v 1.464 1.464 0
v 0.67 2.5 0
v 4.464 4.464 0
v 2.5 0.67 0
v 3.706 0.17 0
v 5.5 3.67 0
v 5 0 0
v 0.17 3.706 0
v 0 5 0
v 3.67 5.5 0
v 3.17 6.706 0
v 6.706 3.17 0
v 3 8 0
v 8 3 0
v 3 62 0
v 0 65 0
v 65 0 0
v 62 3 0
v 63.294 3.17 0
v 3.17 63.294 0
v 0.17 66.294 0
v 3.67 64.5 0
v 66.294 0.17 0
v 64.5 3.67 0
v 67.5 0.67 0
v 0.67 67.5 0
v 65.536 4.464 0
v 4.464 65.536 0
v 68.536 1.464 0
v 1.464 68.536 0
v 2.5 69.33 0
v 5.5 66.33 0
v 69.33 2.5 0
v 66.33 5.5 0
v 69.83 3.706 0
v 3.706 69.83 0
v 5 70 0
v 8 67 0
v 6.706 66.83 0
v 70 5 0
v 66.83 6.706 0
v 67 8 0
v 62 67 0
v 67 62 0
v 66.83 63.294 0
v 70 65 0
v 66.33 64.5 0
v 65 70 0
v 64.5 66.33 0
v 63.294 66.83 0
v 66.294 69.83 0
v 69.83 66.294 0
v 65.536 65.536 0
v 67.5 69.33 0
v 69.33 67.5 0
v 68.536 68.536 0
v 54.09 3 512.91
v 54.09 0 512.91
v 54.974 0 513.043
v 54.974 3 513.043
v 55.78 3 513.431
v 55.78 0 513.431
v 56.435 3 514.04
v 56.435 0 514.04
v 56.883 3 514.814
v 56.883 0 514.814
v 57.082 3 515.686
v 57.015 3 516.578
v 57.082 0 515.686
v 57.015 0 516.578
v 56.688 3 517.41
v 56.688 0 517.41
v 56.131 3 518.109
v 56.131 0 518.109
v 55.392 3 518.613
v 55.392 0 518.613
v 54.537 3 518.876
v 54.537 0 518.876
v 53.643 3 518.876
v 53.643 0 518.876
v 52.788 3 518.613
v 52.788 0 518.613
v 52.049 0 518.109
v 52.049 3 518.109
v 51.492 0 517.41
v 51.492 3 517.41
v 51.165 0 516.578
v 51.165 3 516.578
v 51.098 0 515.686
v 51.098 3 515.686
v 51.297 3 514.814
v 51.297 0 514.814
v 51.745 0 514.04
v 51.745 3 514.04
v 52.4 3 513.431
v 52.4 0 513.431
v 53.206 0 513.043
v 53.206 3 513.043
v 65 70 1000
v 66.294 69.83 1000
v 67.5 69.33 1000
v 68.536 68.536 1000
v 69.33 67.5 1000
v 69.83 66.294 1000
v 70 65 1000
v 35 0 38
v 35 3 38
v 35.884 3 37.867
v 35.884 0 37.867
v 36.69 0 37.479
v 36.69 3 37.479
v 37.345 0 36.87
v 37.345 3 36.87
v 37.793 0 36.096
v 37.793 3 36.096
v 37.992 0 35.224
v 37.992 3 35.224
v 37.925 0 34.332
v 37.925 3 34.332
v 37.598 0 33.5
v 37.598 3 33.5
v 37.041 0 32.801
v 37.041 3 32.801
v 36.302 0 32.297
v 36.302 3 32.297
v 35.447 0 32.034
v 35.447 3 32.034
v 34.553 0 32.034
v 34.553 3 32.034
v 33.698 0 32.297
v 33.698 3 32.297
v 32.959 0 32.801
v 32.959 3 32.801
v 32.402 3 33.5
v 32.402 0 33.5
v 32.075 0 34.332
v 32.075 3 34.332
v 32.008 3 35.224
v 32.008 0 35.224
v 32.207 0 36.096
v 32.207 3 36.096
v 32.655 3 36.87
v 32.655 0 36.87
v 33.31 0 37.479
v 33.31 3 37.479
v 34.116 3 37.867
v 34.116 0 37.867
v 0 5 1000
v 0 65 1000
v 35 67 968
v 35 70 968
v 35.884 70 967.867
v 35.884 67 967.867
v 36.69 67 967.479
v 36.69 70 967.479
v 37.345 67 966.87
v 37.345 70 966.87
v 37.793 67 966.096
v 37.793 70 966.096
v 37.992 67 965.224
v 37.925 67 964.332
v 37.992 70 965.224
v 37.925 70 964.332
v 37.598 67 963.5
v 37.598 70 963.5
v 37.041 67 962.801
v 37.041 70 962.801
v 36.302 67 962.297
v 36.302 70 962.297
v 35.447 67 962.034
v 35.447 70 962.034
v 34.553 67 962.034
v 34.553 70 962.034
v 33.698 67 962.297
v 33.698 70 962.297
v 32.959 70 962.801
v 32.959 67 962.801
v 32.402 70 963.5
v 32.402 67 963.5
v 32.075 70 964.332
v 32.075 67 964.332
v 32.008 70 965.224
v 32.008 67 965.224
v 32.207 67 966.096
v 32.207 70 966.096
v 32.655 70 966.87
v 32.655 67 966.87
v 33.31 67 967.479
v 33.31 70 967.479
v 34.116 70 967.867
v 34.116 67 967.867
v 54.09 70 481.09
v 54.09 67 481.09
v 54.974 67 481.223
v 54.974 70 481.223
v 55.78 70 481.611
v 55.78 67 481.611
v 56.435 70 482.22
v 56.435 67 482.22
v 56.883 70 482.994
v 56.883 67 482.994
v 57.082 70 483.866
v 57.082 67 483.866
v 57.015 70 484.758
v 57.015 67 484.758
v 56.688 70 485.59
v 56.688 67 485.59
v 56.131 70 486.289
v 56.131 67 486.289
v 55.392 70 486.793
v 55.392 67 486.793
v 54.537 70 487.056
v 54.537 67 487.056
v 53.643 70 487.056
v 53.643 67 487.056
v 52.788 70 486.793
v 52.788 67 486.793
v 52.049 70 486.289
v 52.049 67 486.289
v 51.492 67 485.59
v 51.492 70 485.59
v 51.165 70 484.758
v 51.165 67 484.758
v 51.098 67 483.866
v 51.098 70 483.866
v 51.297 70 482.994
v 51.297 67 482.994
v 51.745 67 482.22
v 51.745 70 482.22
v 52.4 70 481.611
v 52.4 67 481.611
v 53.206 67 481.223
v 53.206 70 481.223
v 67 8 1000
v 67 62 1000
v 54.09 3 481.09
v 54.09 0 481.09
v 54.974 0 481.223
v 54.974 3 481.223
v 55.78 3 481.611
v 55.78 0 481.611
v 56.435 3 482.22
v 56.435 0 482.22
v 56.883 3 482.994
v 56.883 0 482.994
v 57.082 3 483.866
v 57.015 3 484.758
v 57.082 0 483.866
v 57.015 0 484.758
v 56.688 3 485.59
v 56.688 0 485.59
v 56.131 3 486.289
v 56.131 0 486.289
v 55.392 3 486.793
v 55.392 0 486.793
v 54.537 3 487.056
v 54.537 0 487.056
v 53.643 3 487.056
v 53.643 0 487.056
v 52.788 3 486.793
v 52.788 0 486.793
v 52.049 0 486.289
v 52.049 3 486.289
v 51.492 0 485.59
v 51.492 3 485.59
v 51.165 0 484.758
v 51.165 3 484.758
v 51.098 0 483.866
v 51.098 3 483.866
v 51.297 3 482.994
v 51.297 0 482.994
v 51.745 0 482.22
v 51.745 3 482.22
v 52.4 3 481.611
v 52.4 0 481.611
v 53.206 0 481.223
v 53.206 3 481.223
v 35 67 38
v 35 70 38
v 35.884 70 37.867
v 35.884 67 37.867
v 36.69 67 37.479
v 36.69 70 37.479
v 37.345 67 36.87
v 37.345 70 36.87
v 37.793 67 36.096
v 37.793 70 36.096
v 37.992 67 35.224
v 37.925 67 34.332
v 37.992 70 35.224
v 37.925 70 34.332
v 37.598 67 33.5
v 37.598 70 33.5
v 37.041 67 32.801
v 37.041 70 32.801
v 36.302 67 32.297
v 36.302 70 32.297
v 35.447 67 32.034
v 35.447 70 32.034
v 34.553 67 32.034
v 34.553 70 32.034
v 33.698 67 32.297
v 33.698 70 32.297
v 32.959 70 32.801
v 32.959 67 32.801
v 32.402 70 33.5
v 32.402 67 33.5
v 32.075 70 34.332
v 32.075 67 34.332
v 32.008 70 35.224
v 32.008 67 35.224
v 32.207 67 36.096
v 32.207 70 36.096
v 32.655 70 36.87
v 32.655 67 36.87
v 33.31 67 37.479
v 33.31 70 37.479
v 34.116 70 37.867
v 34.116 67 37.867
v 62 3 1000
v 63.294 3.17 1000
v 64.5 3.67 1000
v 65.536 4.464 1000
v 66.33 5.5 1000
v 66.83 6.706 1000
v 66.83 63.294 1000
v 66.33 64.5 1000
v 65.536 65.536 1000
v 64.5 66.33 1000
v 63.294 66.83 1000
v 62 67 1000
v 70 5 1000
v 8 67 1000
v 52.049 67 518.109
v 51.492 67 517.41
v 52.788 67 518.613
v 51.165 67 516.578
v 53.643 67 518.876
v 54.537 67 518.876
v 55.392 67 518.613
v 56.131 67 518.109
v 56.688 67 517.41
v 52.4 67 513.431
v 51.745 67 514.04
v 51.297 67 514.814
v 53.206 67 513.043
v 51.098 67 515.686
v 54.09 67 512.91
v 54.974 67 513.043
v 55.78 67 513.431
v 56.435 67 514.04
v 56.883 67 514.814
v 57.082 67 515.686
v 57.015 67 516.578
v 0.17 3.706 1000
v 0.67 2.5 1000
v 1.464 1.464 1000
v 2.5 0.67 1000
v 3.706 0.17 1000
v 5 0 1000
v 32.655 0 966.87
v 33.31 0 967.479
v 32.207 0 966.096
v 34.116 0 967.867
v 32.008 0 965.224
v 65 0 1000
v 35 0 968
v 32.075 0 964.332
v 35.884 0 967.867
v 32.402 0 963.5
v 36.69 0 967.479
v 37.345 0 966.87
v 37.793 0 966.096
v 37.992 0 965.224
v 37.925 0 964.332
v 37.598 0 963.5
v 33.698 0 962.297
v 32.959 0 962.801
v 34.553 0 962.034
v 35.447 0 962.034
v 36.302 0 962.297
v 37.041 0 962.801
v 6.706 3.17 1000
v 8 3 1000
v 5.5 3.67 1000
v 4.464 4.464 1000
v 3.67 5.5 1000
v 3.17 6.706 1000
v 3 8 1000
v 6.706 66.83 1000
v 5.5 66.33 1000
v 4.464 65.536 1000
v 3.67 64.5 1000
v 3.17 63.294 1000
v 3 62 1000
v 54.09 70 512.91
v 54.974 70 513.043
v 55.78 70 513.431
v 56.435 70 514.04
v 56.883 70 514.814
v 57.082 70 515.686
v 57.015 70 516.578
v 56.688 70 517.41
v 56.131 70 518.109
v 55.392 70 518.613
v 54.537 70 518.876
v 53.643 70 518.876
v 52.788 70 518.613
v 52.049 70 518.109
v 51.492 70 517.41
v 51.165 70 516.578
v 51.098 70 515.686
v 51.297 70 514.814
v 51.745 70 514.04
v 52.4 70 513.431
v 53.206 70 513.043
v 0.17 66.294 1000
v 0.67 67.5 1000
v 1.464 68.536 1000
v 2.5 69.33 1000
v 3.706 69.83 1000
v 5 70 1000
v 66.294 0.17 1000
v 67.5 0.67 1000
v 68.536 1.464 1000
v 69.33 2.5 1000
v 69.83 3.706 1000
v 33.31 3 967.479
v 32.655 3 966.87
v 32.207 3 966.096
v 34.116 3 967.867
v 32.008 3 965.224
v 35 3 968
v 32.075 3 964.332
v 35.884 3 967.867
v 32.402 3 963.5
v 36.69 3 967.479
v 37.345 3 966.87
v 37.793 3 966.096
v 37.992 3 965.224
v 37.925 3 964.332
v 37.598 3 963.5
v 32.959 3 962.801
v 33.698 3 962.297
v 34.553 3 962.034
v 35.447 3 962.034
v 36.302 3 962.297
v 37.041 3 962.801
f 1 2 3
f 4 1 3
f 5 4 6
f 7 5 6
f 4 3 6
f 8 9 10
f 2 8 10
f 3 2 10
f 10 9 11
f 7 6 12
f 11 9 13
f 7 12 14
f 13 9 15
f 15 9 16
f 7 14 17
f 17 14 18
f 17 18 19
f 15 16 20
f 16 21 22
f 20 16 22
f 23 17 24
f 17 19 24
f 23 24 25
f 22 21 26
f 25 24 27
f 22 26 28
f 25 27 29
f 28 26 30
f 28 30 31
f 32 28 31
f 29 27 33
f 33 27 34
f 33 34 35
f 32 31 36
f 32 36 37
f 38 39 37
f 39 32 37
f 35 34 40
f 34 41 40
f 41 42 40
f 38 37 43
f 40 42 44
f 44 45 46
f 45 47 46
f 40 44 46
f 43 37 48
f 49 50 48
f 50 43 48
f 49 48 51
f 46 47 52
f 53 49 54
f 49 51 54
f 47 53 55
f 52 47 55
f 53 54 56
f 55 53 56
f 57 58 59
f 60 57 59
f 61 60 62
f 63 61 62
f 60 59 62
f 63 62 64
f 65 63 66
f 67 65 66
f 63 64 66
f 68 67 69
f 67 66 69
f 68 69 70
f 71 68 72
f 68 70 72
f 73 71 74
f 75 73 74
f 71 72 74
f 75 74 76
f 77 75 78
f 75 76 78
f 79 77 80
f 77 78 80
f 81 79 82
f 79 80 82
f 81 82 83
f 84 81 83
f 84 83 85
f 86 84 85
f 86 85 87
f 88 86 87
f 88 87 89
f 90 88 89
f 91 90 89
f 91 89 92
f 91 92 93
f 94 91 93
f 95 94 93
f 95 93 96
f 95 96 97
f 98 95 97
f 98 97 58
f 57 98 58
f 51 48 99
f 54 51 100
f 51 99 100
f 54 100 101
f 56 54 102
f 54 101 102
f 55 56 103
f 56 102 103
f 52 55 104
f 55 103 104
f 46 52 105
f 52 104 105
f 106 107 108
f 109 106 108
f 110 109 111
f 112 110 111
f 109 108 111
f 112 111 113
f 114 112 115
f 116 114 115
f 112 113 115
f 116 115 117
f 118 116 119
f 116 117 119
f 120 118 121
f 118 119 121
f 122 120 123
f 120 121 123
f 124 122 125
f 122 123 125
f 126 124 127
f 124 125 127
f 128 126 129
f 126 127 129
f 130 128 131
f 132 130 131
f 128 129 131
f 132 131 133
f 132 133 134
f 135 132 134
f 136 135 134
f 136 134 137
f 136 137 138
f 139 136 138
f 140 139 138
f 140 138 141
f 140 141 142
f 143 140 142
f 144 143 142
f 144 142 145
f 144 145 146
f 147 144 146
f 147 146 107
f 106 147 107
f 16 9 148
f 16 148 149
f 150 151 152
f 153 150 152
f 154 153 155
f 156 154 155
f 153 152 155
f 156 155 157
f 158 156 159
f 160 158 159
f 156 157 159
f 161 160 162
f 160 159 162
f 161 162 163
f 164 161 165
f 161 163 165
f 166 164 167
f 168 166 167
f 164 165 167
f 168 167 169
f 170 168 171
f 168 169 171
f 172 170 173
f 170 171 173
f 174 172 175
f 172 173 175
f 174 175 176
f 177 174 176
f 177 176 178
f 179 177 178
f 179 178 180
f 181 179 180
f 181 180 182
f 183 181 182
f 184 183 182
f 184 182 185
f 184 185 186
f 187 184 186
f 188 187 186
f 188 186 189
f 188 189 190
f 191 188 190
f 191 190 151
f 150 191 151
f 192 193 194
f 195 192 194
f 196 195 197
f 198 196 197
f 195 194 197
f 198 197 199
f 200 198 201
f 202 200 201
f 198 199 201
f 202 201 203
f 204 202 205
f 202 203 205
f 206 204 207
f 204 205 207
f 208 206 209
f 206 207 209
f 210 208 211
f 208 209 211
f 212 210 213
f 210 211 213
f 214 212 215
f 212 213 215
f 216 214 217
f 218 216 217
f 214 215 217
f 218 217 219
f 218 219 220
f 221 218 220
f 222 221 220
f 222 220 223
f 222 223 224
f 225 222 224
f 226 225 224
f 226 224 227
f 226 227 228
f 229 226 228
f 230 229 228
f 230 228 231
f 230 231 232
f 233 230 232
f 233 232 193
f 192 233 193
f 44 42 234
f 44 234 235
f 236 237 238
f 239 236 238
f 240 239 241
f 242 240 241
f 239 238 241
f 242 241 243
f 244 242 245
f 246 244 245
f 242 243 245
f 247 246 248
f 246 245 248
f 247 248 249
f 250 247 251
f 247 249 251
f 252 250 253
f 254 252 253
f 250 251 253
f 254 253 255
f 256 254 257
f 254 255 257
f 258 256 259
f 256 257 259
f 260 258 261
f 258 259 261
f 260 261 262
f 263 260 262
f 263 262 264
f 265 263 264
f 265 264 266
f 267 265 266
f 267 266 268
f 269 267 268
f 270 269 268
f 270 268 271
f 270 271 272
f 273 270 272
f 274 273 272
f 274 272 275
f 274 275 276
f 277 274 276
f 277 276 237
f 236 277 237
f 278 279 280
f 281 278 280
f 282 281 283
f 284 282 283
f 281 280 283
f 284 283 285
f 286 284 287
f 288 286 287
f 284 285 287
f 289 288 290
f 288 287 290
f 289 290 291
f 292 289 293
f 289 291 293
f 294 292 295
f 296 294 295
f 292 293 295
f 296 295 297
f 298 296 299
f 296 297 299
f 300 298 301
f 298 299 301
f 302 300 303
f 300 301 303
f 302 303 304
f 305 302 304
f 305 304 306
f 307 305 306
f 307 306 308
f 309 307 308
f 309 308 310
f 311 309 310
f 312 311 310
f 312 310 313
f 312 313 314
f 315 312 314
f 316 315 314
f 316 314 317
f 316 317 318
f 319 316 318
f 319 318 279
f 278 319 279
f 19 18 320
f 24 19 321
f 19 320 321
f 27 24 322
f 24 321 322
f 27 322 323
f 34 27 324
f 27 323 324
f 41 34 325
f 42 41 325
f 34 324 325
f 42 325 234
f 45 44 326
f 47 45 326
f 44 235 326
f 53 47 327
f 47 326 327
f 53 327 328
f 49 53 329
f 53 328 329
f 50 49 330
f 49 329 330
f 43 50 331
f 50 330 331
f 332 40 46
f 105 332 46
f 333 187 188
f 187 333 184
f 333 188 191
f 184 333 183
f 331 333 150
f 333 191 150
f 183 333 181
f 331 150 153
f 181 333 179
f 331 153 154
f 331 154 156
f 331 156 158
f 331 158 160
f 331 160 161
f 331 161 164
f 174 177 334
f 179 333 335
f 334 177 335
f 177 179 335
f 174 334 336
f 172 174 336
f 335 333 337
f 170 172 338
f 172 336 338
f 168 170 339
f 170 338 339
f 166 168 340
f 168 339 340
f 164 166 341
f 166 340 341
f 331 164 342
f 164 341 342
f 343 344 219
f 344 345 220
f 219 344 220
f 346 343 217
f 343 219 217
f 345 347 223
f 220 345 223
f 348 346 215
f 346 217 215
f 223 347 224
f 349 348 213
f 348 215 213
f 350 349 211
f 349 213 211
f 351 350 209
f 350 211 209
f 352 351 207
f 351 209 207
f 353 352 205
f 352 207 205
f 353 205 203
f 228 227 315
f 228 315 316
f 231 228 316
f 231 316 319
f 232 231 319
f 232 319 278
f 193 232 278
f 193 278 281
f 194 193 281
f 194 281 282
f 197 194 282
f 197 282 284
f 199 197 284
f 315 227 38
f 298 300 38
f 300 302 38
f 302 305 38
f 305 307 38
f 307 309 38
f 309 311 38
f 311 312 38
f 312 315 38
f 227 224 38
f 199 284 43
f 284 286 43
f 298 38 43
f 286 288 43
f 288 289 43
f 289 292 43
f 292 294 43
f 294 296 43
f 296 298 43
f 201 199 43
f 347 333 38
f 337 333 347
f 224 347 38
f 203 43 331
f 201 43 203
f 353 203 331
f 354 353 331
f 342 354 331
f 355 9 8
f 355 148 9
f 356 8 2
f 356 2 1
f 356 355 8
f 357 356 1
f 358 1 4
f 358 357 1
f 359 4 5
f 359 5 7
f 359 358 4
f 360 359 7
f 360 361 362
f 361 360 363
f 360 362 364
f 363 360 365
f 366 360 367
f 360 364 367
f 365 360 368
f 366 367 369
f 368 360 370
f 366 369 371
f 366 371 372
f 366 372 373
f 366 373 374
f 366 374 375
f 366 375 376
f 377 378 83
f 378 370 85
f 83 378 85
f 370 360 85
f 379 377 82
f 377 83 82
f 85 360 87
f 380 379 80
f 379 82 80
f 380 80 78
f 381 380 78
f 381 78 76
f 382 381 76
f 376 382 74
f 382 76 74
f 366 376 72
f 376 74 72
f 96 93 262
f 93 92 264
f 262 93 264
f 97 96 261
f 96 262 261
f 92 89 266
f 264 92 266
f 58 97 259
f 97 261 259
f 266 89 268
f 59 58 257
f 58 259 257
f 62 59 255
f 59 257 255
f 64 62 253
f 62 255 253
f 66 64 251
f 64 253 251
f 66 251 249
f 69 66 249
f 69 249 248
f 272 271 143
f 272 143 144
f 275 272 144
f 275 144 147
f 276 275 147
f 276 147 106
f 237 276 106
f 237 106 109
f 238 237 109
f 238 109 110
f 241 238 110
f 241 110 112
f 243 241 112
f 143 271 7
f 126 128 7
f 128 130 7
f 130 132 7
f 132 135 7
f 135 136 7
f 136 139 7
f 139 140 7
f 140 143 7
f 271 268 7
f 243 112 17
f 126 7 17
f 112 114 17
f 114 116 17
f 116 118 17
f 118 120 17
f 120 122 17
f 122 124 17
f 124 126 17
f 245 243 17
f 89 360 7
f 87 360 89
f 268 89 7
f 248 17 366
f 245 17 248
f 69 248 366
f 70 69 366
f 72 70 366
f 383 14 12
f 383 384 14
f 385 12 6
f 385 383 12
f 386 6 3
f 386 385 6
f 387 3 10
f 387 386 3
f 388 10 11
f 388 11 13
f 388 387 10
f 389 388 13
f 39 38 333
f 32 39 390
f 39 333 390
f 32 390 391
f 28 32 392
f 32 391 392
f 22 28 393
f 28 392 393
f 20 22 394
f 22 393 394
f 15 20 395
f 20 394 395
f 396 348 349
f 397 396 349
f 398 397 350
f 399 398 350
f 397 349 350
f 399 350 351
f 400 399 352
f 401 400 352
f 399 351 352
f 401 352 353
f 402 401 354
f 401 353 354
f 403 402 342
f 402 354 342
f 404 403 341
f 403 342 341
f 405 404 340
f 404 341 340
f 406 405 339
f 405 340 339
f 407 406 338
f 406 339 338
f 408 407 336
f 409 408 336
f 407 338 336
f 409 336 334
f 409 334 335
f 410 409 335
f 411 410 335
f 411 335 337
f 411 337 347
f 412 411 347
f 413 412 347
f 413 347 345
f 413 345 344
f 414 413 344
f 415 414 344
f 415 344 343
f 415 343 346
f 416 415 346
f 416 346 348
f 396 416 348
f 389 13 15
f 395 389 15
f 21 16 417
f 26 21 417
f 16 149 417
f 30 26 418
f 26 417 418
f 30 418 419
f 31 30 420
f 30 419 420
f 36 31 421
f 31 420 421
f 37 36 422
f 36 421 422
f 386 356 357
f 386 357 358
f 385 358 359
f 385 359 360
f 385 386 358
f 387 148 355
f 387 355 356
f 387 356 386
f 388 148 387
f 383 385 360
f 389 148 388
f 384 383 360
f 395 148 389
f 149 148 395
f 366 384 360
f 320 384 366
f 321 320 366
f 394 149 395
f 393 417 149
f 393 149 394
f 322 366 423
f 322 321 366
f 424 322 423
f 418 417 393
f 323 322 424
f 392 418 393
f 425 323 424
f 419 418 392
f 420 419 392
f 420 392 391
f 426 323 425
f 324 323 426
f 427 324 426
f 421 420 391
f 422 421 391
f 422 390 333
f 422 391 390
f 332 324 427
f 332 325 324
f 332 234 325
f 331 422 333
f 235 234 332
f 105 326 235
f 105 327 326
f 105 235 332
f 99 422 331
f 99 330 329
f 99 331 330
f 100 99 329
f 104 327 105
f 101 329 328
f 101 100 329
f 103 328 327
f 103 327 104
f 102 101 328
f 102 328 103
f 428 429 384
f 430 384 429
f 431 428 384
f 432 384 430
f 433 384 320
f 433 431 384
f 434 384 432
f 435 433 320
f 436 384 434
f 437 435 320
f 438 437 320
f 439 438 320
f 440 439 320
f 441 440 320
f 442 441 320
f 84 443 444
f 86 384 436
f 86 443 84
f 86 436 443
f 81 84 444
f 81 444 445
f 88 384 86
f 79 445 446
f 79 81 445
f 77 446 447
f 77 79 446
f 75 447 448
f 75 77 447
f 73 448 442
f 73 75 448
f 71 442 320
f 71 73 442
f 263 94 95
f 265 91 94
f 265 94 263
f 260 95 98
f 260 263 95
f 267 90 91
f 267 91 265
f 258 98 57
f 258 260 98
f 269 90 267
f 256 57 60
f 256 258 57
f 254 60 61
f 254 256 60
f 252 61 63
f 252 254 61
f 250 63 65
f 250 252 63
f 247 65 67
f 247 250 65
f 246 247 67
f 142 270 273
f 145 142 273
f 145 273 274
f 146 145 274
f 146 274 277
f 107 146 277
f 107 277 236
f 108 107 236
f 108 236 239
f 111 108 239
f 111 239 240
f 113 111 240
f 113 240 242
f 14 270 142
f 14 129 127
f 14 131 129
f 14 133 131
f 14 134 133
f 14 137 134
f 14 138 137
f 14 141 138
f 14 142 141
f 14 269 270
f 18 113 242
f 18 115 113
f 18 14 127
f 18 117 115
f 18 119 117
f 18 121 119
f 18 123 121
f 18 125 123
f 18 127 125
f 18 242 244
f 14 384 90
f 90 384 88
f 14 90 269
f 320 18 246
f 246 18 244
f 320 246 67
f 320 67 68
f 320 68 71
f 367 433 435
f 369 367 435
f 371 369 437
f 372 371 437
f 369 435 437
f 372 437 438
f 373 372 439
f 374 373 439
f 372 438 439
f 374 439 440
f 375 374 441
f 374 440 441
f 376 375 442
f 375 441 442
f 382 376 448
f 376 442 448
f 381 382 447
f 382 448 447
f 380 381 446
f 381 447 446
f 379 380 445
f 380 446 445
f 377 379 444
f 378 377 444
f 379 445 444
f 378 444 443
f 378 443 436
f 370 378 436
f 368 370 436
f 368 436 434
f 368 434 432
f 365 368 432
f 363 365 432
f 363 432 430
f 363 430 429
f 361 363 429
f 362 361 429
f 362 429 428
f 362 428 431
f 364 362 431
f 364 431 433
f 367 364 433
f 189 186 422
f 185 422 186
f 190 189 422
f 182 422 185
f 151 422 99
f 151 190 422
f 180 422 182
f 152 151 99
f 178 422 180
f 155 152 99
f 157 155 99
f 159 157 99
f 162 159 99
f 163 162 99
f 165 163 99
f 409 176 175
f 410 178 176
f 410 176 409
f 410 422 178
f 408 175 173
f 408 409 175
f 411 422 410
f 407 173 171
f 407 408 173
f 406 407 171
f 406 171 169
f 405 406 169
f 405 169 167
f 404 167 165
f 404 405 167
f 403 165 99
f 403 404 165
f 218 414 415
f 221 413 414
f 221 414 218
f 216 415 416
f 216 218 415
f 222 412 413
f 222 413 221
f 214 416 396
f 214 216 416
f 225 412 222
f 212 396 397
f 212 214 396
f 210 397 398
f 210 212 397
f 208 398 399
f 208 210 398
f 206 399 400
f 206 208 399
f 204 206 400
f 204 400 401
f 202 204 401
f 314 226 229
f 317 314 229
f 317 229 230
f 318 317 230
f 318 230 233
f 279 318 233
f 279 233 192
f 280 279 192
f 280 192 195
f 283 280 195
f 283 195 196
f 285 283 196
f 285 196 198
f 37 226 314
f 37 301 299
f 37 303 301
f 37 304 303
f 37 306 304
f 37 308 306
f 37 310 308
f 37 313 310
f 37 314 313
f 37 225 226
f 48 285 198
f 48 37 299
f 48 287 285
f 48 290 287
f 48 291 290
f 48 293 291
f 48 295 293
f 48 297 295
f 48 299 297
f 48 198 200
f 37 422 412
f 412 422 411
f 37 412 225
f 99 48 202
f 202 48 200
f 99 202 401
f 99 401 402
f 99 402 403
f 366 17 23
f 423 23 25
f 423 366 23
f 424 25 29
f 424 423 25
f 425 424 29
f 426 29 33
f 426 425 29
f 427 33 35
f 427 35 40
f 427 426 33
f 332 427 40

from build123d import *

# Parameters (mm, degrees)
SKETCH1_W           = 70
SKETCH1_H           = 70
SKETCH1_W_2         = 64
SKETCH1_H_2         = 64
BOSS_EXTRUDE1_DEPTH = 1000
FILLET1_R           = 5
SKETCH2_R           = 3
CUT_EXTRUDE1_DEPTH  = 70
SKETCH4_R           = 3
CUT_EXTRUDE2_DEPTH  = 70


with BuildPart() as part:
    # Sketch1 → Boss-Extrude1 (new body)
    with BuildSketch(Plane.XY):
        with Locations((35, 35)):
            Rectangle(SKETCH1_W, SKETCH1_H)
        with Locations((35, 35)):
            Rectangle(SKETCH1_W_2, SKETCH1_H_2, mode=Mode.SUBTRACT)
    extrude(amount=BOSS_EXTRUDE1_DEPTH)

    # Fillet1
    fillet1_edges = [part.edges().sort_by_distance(p)[0] for p in [
        (3, 67, 500),
        (3, 3, 500),
        (67, 3, 500),
        (67, 67, 500),
        (0, 70, 500),
        (70, 70, 500),
        (70, 0, 500),
        (0, 0, 500),
    ]]
    fillet(fillet1_edges, radius=FILLET1_R)

    # Sketch2 → Cut-Extrude1 (cut)
    with BuildSketch(Plane(origin=(0, 70, 0), x_dir=(1, 0, 0), z_dir=(0, 1, 0))):
        with Locations(Location((35, -965, 0), (0, 0, 270))):
            Circle(SKETCH2_R)
        with Locations(Location((35, -35, 0), (0, 0, 270))):
            Circle(SKETCH2_R)
    extrude(amount=-CUT_EXTRUDE1_DEPTH, mode=Mode.SUBTRACT)

    # Sketch4 → Cut-Extrude2 (cut)
    with BuildSketch(Plane.XZ):
        with Locations(Location((54.09, 515.91, 0), (0, 0, 270))):
            Circle(SKETCH4_R)
        with Locations(Location((54.09, 484.09, 0), (0, 0, 270))):
            Circle(SKETCH4_R)
    extrude(amount=-CUT_EXTRUDE2_DEPTH, mode=Mode.SUBTRACT)


solid = part.part
